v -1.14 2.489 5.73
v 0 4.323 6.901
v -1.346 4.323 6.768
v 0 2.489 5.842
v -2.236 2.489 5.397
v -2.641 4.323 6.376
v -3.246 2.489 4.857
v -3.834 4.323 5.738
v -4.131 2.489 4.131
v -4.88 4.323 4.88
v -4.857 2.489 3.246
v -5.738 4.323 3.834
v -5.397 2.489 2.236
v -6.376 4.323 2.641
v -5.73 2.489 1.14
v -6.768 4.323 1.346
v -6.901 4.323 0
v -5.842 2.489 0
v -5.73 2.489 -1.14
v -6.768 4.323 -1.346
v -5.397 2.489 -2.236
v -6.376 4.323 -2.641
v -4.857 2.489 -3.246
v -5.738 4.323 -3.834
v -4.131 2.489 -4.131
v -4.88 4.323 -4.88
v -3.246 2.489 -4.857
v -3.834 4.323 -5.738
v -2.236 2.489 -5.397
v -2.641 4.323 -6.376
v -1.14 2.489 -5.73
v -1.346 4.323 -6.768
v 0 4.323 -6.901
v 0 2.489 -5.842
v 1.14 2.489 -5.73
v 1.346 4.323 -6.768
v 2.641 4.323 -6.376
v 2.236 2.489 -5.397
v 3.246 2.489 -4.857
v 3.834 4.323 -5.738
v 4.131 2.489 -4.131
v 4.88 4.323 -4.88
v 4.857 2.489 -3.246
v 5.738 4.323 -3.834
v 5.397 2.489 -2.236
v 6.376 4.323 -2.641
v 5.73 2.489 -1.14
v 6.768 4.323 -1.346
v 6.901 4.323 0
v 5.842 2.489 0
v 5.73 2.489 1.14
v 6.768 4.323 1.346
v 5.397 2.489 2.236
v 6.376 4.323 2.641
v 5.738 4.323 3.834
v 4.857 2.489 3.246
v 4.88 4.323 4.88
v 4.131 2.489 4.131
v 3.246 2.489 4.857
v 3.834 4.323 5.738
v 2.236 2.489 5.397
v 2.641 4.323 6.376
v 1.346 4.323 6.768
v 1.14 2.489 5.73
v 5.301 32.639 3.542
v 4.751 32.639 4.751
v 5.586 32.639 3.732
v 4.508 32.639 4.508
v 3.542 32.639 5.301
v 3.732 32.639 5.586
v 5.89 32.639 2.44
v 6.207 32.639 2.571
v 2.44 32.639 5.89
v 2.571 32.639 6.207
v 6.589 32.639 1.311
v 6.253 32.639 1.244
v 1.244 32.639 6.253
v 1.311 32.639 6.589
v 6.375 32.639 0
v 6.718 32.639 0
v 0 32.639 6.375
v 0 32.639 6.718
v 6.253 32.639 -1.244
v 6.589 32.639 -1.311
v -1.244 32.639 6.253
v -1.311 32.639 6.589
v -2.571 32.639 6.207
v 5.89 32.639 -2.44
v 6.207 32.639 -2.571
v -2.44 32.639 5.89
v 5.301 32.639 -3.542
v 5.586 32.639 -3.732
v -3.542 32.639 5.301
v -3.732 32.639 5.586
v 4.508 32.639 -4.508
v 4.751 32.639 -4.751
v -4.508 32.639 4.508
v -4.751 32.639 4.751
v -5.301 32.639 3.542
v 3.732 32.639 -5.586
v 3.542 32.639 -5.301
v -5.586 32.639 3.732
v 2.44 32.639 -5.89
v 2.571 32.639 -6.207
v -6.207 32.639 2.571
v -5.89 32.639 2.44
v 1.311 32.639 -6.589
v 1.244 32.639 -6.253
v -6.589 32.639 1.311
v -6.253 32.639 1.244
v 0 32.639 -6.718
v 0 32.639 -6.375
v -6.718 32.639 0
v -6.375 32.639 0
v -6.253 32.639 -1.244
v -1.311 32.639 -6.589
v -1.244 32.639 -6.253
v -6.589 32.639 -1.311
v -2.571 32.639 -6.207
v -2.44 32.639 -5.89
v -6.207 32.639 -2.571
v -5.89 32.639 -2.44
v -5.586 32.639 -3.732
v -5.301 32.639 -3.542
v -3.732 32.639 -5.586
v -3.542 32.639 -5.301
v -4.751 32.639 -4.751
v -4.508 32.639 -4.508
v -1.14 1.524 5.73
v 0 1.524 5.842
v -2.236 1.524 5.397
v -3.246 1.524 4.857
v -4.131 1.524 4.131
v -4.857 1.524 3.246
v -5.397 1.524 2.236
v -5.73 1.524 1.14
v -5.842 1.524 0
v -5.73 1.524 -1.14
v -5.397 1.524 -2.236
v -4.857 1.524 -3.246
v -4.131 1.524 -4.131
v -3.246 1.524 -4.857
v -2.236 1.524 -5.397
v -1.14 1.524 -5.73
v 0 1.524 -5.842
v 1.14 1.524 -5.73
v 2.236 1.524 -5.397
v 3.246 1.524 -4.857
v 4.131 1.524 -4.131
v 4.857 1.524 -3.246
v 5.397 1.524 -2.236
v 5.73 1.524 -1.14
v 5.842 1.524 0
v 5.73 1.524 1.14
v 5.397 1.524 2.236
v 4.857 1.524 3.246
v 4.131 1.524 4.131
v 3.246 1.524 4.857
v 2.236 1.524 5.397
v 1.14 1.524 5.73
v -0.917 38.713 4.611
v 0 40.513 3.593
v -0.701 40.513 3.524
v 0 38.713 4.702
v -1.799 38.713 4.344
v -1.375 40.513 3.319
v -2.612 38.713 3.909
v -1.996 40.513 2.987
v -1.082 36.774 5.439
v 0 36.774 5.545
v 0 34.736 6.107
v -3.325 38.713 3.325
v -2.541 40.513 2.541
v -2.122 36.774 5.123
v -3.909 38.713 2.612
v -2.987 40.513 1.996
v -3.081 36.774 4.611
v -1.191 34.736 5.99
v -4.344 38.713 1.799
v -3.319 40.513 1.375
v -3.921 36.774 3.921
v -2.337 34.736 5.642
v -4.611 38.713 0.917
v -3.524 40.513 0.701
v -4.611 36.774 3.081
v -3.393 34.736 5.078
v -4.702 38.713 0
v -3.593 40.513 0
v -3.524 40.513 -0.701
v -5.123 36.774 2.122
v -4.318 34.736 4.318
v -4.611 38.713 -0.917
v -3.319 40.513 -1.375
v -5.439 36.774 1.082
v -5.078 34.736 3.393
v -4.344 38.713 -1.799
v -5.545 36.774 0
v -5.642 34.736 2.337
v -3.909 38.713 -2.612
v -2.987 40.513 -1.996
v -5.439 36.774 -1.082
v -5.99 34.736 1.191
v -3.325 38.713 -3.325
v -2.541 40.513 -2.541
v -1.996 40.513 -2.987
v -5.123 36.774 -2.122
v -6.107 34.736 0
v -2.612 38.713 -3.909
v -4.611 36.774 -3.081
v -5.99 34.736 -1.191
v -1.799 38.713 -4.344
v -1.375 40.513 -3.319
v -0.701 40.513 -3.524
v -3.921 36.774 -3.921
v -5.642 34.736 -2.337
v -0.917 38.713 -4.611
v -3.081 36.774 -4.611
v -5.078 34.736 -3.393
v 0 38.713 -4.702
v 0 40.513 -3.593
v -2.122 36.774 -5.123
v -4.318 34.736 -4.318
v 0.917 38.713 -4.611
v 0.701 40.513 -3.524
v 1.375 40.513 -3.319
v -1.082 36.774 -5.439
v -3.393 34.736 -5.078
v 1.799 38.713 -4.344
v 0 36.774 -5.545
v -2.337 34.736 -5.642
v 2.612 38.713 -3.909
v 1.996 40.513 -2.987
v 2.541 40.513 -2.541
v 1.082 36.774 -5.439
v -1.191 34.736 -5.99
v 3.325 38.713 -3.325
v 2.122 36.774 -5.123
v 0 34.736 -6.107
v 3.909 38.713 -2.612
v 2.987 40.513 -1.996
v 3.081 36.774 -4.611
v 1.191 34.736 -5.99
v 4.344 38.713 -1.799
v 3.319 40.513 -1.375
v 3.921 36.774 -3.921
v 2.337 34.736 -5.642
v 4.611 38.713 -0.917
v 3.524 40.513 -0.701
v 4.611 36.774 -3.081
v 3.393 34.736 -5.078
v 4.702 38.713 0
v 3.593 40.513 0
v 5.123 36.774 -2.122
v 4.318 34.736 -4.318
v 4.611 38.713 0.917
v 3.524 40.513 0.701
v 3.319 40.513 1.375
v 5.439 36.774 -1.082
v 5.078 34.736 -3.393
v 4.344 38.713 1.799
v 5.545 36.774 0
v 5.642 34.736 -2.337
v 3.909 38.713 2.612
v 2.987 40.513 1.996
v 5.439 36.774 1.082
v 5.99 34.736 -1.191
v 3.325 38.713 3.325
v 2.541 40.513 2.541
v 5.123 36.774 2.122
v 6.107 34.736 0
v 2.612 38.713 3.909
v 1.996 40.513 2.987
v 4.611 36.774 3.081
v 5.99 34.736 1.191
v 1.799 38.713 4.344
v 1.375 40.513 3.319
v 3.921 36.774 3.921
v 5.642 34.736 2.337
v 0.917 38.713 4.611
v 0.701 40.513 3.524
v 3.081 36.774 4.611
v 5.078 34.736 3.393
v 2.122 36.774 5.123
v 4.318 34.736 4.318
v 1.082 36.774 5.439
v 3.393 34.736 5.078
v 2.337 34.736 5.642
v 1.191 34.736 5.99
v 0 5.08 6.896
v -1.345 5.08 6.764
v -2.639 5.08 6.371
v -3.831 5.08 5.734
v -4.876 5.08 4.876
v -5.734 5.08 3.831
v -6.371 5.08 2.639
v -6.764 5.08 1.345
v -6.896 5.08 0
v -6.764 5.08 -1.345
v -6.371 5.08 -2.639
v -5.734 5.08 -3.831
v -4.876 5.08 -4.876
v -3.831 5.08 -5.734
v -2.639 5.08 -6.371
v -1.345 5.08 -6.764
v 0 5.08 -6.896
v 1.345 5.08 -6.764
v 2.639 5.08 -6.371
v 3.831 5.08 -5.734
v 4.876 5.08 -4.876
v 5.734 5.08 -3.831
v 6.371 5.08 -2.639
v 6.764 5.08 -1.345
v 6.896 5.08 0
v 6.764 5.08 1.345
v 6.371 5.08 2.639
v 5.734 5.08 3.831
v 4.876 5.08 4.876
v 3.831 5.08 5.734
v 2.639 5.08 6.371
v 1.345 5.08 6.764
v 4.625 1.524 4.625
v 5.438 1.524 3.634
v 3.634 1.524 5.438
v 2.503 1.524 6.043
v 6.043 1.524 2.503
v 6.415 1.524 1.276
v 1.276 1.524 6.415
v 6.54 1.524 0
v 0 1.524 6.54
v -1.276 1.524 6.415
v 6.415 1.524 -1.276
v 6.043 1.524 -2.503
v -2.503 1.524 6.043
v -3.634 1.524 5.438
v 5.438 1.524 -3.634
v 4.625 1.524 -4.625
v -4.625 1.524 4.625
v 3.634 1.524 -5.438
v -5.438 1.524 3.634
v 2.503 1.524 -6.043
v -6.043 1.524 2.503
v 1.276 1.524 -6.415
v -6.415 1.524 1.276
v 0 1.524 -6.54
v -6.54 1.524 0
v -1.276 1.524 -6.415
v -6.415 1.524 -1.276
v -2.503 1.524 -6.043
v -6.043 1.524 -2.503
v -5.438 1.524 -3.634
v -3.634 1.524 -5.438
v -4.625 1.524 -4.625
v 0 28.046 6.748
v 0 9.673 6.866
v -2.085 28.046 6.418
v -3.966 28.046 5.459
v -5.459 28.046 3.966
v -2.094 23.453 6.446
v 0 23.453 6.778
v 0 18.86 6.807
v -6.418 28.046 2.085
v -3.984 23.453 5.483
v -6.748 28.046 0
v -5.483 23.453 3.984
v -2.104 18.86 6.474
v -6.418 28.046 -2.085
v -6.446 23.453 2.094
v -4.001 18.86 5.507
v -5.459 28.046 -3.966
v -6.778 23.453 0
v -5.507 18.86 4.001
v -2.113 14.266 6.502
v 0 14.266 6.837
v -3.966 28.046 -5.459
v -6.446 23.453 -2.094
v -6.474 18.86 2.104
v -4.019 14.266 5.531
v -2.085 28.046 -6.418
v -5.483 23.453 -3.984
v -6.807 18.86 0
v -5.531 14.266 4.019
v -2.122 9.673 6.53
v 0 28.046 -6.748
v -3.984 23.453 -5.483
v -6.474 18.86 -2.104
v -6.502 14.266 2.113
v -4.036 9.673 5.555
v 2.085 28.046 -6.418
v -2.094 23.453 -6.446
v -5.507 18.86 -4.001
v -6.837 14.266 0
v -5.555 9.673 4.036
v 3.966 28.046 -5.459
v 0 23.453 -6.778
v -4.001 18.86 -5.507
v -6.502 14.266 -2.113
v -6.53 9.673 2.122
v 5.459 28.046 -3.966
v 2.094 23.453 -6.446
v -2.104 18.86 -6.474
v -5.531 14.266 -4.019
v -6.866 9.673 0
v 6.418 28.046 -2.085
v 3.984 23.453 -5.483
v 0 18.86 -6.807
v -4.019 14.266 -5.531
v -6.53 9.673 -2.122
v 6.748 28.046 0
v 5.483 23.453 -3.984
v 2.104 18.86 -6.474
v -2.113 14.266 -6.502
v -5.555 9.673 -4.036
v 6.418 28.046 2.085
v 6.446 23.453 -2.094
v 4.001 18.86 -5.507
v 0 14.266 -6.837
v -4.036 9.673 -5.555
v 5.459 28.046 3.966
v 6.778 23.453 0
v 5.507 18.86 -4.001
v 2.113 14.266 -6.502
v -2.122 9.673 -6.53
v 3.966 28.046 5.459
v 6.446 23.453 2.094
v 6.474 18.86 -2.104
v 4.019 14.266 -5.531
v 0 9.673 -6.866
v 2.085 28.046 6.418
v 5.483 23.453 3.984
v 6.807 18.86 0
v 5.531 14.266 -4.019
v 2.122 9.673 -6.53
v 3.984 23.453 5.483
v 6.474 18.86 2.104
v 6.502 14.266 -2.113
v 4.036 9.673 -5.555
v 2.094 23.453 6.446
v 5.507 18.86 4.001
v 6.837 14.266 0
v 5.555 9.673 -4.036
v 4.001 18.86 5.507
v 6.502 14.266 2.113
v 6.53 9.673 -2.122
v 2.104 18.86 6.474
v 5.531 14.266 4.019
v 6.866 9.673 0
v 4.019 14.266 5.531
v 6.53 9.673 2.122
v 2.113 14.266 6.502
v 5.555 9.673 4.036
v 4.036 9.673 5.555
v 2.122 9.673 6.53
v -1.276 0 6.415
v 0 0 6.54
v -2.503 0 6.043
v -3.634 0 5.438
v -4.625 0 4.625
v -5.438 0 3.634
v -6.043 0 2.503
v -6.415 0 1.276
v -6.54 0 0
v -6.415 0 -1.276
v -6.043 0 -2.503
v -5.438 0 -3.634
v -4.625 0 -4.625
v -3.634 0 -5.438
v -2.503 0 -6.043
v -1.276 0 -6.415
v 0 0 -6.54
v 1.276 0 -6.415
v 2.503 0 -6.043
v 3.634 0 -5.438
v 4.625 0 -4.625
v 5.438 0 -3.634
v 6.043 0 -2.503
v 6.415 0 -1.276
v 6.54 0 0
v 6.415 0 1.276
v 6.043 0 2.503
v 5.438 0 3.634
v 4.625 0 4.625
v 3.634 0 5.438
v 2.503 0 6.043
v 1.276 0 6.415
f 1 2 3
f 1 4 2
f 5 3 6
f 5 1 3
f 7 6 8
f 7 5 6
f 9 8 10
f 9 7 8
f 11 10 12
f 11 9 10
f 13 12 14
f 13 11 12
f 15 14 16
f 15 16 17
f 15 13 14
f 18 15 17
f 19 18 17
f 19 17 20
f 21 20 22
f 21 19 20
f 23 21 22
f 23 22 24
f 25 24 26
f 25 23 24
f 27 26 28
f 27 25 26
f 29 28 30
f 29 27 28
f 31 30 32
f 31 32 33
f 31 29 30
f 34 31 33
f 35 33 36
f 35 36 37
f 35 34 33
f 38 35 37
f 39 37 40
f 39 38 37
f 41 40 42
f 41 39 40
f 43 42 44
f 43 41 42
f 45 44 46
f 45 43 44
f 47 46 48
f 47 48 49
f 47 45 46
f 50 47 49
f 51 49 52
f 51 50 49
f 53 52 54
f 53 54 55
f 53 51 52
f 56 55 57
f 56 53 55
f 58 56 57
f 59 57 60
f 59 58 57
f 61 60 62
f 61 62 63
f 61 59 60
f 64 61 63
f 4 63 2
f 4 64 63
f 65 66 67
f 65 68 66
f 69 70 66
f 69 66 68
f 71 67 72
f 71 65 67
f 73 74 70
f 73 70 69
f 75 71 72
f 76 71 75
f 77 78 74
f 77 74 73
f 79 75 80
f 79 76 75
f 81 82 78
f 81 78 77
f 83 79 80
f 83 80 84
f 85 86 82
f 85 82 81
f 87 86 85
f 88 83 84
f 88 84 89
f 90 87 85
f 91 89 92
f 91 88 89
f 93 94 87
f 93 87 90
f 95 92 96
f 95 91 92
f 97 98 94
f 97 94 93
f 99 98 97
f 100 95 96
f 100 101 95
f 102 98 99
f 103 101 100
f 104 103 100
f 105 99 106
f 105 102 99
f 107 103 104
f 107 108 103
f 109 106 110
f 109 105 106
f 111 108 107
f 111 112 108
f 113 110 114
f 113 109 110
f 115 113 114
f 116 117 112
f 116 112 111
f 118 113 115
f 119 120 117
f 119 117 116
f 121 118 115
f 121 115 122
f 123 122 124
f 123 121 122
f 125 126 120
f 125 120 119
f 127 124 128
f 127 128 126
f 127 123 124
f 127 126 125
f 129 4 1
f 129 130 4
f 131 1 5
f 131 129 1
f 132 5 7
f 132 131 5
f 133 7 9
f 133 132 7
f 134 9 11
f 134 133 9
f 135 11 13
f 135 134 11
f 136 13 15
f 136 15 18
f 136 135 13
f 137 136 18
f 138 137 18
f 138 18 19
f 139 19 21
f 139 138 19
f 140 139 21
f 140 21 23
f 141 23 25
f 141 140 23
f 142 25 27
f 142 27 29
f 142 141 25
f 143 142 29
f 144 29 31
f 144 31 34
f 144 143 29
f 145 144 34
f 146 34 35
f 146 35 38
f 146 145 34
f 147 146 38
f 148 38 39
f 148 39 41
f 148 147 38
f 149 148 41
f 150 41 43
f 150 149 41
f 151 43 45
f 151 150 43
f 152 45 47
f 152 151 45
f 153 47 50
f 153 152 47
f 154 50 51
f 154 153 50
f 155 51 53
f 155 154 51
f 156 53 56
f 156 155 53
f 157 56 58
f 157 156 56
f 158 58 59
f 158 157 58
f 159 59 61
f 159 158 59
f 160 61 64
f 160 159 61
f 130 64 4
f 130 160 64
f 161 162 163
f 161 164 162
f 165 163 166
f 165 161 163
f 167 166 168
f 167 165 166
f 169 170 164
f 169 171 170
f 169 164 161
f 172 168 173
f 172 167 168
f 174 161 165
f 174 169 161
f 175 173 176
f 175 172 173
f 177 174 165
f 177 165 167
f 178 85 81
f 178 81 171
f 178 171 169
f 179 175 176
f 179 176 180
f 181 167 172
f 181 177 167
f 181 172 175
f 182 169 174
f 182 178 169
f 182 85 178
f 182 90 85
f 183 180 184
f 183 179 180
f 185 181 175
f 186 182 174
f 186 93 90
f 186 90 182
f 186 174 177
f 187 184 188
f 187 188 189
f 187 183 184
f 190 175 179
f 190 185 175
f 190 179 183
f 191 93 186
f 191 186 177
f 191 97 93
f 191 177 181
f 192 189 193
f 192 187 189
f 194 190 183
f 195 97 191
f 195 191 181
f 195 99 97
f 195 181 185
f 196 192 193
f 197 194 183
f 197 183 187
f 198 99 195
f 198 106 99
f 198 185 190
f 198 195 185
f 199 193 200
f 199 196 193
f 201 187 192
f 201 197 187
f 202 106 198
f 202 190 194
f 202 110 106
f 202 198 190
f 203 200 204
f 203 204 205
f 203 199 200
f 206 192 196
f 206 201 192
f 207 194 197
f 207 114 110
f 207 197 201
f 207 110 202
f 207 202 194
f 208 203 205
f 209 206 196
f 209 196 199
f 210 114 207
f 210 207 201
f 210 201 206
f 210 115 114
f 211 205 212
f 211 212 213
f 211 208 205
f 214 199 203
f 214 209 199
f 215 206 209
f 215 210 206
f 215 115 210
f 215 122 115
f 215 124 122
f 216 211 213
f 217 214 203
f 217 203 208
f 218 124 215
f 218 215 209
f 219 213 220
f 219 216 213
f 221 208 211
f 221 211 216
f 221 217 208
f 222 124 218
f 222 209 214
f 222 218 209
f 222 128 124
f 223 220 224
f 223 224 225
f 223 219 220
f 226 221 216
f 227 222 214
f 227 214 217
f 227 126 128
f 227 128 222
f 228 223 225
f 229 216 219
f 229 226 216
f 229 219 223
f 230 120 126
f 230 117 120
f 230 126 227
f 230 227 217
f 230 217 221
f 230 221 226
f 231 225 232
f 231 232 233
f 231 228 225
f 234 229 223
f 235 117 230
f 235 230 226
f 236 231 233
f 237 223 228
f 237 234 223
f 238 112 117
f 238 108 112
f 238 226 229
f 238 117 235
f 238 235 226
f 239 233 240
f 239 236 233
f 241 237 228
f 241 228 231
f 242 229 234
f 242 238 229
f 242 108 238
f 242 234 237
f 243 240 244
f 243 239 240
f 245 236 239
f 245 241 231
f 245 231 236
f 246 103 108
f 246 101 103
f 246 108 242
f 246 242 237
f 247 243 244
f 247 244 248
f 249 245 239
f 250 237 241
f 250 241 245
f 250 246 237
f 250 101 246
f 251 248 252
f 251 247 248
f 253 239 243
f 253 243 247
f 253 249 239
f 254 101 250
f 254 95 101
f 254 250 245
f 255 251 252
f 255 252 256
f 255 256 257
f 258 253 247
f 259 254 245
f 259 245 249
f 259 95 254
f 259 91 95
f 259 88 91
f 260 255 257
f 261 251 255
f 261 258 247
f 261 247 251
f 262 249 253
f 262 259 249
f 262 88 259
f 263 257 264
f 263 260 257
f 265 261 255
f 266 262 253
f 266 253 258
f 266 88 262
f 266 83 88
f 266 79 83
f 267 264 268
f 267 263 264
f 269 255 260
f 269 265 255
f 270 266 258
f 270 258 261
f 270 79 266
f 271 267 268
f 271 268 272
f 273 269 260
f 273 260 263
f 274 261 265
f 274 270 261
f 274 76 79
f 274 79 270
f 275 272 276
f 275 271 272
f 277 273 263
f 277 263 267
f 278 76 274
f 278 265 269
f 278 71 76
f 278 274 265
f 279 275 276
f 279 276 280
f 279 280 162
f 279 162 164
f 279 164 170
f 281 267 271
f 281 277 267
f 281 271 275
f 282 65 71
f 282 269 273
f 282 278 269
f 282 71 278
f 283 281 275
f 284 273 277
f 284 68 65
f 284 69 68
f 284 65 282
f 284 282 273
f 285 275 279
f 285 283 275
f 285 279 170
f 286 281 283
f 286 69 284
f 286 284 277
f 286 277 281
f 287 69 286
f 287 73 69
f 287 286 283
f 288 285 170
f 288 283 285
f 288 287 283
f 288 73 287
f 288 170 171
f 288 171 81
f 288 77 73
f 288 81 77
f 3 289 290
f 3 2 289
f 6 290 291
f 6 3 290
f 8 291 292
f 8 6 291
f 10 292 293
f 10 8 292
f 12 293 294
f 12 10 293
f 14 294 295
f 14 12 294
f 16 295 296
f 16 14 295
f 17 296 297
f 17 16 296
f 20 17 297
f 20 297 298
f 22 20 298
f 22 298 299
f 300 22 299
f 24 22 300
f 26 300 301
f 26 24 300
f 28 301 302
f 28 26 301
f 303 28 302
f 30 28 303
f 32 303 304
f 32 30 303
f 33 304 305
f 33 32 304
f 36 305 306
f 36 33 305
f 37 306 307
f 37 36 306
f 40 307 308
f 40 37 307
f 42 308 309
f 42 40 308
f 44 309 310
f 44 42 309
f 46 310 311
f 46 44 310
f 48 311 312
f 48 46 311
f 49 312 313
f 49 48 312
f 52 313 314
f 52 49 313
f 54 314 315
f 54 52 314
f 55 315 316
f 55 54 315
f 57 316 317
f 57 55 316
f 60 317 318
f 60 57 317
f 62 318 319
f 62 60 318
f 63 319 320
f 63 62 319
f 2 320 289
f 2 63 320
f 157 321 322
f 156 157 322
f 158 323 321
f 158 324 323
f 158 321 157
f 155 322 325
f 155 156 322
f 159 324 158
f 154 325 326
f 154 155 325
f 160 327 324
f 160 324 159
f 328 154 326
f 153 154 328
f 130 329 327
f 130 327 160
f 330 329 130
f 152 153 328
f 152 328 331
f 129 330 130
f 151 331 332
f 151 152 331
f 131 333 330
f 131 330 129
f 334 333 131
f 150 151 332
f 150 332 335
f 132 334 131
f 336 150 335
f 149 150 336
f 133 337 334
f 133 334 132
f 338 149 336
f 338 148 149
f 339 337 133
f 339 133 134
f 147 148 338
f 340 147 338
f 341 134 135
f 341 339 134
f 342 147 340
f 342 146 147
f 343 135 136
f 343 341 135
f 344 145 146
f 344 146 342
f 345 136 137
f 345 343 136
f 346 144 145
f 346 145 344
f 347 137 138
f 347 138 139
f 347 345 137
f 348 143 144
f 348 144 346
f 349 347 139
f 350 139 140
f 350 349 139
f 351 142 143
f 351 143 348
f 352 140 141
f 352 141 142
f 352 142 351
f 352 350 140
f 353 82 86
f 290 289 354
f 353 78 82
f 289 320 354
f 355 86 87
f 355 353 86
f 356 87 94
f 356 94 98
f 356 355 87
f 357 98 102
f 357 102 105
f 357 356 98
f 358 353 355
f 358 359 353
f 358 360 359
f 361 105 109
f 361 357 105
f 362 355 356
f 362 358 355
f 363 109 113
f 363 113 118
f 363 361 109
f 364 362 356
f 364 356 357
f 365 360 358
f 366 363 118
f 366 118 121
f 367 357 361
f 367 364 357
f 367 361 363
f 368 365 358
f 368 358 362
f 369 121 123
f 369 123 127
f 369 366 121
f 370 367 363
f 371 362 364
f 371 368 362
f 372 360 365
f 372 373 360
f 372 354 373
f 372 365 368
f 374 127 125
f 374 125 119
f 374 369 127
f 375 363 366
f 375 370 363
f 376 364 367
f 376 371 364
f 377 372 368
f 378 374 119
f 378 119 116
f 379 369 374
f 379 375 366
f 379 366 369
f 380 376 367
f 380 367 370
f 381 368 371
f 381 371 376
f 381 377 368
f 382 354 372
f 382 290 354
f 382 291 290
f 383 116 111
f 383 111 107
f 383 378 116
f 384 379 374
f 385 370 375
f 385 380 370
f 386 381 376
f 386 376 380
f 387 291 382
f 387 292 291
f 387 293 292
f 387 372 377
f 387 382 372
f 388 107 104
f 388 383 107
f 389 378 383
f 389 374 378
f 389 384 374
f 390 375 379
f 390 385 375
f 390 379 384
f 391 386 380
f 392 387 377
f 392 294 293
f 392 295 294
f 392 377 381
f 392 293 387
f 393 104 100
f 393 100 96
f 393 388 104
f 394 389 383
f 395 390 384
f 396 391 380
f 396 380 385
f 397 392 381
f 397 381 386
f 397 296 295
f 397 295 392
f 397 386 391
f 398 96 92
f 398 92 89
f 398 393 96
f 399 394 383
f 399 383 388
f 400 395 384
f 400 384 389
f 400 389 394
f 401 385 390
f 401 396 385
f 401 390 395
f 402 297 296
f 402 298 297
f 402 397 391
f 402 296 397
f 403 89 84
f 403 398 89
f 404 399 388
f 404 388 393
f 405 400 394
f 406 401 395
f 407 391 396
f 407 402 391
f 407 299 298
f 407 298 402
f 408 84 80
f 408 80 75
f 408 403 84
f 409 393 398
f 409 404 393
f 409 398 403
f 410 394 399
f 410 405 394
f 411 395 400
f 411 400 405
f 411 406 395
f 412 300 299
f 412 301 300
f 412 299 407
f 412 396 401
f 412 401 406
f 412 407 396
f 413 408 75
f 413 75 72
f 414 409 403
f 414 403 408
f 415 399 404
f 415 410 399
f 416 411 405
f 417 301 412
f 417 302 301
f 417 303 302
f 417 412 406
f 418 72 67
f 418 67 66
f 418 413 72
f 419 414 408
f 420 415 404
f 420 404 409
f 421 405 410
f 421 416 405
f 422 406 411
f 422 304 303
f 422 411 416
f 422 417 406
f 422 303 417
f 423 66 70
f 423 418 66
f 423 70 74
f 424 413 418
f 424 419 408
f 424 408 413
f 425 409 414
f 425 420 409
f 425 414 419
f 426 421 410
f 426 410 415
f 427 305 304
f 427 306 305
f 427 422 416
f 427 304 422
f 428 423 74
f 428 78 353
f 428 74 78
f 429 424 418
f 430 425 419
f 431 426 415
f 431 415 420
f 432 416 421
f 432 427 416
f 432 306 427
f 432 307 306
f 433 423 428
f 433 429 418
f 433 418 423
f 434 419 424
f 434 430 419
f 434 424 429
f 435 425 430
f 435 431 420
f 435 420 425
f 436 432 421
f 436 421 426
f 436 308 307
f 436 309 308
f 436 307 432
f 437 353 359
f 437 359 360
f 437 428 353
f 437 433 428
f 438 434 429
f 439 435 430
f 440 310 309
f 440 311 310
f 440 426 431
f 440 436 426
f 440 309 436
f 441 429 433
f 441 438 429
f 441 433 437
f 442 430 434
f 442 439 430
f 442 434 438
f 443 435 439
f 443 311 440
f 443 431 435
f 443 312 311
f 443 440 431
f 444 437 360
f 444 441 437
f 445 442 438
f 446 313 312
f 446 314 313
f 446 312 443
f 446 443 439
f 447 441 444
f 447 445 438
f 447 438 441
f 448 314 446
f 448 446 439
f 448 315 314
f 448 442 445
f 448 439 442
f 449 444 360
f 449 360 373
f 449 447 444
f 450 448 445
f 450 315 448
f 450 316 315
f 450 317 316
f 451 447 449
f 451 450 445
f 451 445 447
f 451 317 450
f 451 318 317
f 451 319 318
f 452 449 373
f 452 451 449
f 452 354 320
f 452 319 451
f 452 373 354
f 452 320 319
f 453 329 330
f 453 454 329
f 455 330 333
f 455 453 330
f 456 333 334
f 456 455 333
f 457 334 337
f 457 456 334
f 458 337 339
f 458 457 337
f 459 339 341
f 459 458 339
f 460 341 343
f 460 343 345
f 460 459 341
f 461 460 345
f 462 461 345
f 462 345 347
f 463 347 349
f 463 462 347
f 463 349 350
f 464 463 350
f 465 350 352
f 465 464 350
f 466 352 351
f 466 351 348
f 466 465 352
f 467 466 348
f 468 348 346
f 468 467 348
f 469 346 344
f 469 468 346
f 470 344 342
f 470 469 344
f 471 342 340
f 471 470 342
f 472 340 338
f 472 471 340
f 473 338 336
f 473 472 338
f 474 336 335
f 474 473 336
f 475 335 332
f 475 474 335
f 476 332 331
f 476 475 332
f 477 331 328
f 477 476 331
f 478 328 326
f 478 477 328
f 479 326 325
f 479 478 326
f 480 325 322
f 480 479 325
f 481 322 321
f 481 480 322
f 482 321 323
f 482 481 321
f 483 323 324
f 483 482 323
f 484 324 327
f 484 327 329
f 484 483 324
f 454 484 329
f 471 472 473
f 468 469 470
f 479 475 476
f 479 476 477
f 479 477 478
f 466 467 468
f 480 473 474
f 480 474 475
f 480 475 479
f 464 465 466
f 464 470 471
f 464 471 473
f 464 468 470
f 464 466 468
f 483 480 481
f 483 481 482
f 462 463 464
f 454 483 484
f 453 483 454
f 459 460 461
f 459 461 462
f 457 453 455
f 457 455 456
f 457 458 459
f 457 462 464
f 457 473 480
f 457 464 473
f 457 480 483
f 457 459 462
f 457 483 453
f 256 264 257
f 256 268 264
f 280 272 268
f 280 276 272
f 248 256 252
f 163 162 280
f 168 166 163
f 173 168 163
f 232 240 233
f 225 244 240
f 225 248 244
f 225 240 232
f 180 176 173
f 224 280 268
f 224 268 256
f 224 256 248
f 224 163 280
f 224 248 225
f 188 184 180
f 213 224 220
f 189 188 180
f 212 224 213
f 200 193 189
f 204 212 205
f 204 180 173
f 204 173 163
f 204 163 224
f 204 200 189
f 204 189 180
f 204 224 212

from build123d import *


with BuildPart() as f1:
    # F0 (on Right) → F1 (revolve)
    with BuildSketch(Plane.YZ):
        Polygon((0, 6.5405), (0, 0), (5.08, 0), (5.08, 6.8961), (4.323409, 6.900981), (2.4892, 5.842), (1.524, 5.842), (1.524, 6.5405), align=None)
        Polygon((5.08, 6.8961), (5.08, 0), (32.639, 0), (32.639, 6.7183), align=None)
    revolve(axis=Axis((0, 18.390228, 0), (0, -1, 0)))

    # F2 (on Right) → F3 (revolve)
    with BuildSketch(Plane.YZ):
        with BuildLine():
            ThreePointArc((40.513, 3.592921), (36.774285, 5.545277), (32.639, 6.3754))
            Line((32.639, 6.3754), (32.639, 0))
            Line((32.639, 0), (40.513, 0))
            Line((40.513, 0), (40.513, 3.592921))
        make_face()
    revolve(axis=Axis((0, 36.576, 0), (0, -1, 0)))


solid = f1.part
